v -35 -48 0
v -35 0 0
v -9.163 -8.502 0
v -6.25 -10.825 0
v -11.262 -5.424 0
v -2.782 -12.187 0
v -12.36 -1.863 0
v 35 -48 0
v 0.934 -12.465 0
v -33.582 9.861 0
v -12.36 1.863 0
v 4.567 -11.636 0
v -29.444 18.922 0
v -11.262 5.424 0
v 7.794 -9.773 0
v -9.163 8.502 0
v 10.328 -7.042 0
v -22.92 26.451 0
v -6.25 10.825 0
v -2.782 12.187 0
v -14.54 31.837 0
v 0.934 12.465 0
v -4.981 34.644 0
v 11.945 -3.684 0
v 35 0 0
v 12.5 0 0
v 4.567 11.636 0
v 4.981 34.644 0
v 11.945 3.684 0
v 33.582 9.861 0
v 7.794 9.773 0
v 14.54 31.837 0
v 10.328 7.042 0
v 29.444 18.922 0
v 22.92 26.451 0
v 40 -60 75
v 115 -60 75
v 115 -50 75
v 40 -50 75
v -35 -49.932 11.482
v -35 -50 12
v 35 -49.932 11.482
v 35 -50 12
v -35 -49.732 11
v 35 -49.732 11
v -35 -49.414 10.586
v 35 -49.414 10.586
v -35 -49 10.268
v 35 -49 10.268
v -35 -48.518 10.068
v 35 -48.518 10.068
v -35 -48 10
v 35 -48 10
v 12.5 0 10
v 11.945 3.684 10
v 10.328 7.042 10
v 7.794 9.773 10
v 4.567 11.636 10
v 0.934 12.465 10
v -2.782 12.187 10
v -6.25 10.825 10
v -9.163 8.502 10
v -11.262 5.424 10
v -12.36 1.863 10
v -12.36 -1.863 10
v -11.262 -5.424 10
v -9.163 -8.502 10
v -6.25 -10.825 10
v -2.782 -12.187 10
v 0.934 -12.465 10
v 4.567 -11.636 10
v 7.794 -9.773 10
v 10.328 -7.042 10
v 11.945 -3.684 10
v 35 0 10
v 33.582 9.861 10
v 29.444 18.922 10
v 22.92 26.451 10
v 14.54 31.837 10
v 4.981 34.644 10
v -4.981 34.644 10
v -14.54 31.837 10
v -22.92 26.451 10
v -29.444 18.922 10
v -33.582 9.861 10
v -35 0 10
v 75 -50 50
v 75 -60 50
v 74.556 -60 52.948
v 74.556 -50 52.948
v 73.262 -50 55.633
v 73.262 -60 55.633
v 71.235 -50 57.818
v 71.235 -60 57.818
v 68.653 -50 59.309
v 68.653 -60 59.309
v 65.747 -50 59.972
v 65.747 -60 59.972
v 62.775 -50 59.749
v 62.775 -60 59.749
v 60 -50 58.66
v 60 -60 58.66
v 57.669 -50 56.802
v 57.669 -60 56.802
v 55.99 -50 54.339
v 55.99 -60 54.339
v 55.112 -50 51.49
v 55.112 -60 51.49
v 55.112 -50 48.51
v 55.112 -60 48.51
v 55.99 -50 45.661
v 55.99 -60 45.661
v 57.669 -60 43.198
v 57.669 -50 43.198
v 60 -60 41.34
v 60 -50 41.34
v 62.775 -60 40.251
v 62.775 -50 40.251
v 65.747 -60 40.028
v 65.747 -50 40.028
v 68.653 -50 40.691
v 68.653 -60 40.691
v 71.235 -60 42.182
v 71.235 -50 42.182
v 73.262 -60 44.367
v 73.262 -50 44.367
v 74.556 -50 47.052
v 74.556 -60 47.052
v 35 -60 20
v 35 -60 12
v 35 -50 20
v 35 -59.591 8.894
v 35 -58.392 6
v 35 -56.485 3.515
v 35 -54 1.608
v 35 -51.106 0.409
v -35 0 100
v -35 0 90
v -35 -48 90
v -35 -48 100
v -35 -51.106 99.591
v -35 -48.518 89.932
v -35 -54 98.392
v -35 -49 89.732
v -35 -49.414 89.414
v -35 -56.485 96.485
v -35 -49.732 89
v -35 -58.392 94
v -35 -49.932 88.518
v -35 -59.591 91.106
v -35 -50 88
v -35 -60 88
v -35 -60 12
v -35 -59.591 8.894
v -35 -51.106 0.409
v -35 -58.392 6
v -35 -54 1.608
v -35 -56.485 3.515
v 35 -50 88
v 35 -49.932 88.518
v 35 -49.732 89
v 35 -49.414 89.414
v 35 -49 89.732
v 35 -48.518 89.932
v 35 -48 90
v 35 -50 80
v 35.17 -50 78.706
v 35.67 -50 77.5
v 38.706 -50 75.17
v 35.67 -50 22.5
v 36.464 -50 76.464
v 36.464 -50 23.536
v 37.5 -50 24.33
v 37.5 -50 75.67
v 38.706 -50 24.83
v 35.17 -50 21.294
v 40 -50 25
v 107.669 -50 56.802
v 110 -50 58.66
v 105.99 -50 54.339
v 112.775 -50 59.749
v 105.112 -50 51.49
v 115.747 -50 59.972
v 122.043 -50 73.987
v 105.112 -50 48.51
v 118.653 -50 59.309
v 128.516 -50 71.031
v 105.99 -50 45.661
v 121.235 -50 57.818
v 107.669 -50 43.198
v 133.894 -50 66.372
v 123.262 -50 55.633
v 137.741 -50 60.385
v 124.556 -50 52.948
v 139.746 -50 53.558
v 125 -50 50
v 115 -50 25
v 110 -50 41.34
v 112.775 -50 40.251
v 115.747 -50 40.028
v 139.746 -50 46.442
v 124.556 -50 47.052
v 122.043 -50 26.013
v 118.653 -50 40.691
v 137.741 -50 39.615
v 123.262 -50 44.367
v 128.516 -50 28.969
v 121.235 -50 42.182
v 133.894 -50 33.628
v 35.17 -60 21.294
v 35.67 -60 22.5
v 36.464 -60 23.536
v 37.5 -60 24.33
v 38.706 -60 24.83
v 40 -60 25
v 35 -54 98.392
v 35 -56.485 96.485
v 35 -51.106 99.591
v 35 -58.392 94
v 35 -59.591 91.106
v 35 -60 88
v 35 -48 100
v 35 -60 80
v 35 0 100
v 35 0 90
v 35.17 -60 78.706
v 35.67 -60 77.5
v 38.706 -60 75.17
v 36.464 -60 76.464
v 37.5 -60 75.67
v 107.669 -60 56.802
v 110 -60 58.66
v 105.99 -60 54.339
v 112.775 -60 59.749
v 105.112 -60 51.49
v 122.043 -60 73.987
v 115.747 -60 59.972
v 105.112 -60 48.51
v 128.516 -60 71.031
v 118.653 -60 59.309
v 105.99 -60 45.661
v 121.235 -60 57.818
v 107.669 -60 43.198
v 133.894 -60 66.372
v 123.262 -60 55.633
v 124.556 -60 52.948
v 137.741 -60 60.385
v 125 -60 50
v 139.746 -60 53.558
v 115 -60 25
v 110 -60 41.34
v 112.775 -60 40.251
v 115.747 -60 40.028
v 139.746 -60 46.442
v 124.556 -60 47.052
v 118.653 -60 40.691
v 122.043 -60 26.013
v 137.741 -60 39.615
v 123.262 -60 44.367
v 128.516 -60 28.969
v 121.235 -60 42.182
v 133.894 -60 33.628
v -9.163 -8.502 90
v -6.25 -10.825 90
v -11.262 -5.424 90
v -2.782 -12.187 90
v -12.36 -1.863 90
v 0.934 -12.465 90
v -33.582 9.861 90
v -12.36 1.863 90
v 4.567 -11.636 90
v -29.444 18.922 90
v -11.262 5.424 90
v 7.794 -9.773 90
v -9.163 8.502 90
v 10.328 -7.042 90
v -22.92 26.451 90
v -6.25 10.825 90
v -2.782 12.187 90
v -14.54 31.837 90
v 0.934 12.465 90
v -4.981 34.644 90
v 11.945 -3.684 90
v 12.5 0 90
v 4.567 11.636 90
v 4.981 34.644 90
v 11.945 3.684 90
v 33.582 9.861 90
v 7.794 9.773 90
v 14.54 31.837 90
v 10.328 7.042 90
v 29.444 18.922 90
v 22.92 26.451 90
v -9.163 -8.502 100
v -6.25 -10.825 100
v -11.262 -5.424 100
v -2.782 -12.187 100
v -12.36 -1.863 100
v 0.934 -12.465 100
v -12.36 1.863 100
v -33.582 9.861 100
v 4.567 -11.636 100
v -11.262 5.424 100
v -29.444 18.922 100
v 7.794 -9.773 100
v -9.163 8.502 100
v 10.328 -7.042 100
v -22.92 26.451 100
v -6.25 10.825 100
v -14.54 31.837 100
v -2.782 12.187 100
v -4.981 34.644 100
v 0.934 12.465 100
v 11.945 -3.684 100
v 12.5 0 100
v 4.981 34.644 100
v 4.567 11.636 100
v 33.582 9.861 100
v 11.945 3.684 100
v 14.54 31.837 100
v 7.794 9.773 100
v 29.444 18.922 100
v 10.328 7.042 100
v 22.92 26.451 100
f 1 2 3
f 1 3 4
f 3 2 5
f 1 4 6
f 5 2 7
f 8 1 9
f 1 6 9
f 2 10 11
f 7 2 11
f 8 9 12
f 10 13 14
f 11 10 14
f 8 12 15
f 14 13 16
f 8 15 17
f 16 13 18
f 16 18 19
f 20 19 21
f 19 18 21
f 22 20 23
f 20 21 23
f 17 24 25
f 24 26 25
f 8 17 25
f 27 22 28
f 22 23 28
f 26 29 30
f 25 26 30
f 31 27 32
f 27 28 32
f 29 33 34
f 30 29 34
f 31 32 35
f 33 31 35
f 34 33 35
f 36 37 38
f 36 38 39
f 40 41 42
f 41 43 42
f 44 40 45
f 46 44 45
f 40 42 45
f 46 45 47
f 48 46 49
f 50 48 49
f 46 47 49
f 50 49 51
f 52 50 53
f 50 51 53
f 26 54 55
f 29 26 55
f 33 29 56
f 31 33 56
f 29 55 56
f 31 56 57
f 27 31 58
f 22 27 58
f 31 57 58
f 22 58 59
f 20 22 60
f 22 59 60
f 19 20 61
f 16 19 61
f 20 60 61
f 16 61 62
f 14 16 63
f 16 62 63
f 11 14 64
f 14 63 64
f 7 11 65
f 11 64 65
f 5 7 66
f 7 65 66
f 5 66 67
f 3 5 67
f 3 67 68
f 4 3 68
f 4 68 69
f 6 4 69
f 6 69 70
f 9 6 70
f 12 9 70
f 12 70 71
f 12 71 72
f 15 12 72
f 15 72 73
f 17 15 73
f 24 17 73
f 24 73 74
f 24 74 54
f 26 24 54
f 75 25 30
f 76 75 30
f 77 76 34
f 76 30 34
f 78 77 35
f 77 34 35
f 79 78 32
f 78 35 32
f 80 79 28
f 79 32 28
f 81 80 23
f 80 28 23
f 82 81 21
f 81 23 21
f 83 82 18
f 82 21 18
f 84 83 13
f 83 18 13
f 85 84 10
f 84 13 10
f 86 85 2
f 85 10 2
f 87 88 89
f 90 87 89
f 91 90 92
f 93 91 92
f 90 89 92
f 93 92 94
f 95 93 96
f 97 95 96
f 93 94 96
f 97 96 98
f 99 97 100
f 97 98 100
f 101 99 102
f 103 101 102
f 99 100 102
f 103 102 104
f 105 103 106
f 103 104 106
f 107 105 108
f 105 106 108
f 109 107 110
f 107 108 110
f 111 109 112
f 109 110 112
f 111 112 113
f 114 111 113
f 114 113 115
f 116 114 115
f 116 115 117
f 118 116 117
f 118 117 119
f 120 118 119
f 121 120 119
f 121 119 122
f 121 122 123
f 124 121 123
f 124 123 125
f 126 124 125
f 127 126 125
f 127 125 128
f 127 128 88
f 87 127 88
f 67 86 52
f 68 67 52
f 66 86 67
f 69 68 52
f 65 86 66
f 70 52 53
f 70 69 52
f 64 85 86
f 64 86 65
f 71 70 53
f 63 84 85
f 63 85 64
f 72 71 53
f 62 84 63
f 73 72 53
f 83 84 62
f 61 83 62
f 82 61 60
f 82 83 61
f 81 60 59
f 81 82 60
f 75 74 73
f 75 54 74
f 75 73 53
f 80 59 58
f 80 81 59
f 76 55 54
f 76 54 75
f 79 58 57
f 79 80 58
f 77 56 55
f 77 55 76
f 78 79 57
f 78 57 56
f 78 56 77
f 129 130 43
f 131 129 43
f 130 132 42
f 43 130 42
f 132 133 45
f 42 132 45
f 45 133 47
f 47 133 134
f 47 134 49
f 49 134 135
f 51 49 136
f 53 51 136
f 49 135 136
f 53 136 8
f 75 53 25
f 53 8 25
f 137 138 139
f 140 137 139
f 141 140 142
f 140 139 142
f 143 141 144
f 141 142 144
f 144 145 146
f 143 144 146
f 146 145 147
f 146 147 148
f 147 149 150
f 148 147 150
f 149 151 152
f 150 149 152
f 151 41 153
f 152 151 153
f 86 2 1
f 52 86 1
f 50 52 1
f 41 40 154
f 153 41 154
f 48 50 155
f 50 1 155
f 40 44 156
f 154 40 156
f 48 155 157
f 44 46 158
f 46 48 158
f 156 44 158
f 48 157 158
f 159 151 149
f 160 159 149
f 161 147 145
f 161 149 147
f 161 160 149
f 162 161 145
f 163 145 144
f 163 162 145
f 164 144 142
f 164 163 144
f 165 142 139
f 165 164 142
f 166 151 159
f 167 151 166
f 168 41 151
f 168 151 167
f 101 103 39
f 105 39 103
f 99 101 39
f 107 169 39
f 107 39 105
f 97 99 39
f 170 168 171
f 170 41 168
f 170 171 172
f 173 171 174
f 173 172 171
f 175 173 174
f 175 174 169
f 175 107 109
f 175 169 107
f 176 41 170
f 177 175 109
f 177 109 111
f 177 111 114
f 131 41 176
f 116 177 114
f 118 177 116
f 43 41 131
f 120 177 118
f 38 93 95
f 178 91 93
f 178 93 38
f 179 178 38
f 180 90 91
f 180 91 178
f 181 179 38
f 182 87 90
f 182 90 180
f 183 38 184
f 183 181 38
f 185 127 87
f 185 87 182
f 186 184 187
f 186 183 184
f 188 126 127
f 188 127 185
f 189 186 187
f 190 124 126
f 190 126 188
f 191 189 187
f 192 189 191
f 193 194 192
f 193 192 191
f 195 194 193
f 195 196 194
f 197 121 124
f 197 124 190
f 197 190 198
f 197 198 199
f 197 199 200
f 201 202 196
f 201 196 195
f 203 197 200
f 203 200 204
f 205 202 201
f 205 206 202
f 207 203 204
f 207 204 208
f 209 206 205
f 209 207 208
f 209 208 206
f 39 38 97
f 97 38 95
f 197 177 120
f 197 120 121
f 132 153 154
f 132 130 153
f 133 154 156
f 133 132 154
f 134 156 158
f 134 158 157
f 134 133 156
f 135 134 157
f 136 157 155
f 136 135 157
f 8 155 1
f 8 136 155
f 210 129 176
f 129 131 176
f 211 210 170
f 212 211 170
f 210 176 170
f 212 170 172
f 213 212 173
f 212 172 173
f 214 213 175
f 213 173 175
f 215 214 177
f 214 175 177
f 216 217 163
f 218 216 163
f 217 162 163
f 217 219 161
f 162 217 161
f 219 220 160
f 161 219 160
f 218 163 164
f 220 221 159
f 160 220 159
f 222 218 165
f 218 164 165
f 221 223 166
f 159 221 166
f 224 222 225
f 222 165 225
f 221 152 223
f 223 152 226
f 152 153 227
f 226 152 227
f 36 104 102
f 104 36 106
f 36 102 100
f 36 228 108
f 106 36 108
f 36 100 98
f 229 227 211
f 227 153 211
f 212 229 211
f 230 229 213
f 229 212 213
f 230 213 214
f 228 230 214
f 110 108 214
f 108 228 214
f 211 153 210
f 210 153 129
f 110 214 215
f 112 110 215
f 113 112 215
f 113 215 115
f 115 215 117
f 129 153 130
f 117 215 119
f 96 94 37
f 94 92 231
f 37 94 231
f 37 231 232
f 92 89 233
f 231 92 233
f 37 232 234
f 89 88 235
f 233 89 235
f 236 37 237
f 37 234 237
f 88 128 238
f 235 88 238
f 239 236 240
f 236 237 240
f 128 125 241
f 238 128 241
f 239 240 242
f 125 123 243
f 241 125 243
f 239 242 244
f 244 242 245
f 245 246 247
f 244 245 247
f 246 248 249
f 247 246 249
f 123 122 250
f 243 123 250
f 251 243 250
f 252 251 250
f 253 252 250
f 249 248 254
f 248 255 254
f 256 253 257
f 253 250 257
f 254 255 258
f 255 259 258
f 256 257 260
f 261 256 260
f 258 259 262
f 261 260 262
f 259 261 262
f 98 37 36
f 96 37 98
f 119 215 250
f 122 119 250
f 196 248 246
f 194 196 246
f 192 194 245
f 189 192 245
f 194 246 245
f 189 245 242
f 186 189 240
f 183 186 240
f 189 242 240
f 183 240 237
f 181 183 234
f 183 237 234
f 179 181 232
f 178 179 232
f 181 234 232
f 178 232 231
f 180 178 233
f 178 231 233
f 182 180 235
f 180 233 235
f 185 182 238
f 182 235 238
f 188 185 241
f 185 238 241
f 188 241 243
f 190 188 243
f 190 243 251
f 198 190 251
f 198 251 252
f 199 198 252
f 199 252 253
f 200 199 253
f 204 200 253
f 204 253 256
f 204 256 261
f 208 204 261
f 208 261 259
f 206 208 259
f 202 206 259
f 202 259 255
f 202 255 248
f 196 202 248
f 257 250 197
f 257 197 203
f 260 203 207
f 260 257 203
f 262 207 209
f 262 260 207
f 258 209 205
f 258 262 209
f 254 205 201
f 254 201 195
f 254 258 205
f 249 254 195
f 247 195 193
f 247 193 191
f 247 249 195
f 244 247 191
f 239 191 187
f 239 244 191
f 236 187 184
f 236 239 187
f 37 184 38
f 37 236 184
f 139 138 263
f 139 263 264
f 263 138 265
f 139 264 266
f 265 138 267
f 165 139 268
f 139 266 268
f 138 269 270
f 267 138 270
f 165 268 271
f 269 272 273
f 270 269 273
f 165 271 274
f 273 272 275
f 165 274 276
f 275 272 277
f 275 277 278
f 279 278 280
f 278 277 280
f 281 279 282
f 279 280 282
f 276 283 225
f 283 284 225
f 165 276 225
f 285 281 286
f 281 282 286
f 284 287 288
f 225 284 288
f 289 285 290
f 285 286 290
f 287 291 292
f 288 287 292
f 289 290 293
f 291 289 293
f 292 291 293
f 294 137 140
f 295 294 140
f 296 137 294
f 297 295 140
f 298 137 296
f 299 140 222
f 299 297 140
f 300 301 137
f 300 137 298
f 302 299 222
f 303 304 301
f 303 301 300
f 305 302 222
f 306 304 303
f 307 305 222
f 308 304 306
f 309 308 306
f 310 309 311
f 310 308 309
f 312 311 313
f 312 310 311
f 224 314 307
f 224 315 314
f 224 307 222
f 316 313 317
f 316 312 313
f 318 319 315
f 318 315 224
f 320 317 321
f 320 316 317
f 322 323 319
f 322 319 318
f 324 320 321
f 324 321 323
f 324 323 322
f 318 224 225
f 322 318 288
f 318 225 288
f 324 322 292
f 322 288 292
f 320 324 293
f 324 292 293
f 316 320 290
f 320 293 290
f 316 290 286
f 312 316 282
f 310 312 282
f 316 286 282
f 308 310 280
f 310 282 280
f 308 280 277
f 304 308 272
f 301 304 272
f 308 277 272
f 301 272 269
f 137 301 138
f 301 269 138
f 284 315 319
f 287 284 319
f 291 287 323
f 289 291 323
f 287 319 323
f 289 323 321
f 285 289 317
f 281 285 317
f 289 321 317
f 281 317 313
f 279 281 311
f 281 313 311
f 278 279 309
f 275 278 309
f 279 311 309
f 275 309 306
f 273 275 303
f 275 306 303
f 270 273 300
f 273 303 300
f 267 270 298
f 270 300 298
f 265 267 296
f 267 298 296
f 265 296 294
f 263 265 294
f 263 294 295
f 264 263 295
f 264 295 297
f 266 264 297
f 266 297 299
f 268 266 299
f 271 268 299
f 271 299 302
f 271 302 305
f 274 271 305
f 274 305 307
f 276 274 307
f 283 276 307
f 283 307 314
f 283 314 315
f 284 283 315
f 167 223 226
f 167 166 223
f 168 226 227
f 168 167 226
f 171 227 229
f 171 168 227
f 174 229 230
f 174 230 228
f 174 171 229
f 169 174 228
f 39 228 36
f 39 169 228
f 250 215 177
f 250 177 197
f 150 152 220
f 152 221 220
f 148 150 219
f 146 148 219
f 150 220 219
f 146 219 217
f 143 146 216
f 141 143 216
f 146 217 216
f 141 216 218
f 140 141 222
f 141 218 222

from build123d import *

# Parameters (mm, degrees)
U_SHAPE_DEPTH        = 100
FILLET_2_R           = 12
THICKNESS_T          = -10
SKETCH8_R            = 12.5
INNER_HOLE_DEPTH     = 122.757956619
TONGUE_DEPTH         = 10
SKETCH9_R            = 10
MOUNTING_HOLES_DEPTH = 197.53244007
FILLET1_R            = 5


with BuildPart() as part:
    # Sketch4 → "U" shape (new body)
    with BuildSketch(Plane.XY):
        with BuildLine():
            Line((-35, 0), (-35, -60))
            Line((-35, -60), (35, -60))
            Line((35, -60), (35, 0))
            ThreePointArc((35, 0), (0, 35), (-35, 0))
        make_face()
    extrude(amount=U_SHAPE_DEPTH)

    # Fillet 2
    fillet_2_edges = [part.edges().sort_by_distance(p)[0] for p in [
        (0, -60, 100),
        (0, -60, 0),
    ]]
    fillet(fillet_2_edges, radius=FILLET_2_R)

    # Thickness
    thickness_openings = [part.faces().sort_by_distance(p)[0] for p in [
        (35, -29.715655007, 50),
        (-35, -29.715655007, 50),
        (0, 35, 50),
    ]]
    offset(amount=THICKNESS_T, openings=thickness_openings, kind=Kind.INTERSECTION)

    # Sketch8 → Inner Hole (cut, through all)
    with BuildSketch(Plane.XY.offset(100)):
        Circle(SKETCH8_R)
    extrude(amount=-INNER_HOLE_DEPTH, mode=Mode.SUBTRACT)

    # Sketch7 → Tongue (add)
    with BuildSketch(Plane.XZ.offset(60)):
        with BuildLine():
            Line((35, 25), (115, 25))
            ThreePointArc((115, 25), (140, 50), (115, 75))
            Line((115, 75), (35, 75))
            Line((35, 75), (35, 25))
        make_face()
    extrude(amount=-TONGUE_DEPTH)

    # Sketch9 → Mounting Holes (cut, through all)
    with BuildSketch(Plane.XZ.offset(60)):
        with Locations((65, 50)):
            Circle(SKETCH9_R)
        with Locations((115, 50)):
            Circle(SKETCH9_R)
    extrude(amount=-MOUNTING_HOLES_DEPTH, mode=Mode.SUBTRACT)

    # Fillet1
    fillet1_edges = [part.edges().sort_by_distance(p)[0] for p in [
        (35, -55, 75),
        (35, -55, 25),
    ]]
    fillet(fillet1_edges, radius=FILLET1_R)


solid = part.part
